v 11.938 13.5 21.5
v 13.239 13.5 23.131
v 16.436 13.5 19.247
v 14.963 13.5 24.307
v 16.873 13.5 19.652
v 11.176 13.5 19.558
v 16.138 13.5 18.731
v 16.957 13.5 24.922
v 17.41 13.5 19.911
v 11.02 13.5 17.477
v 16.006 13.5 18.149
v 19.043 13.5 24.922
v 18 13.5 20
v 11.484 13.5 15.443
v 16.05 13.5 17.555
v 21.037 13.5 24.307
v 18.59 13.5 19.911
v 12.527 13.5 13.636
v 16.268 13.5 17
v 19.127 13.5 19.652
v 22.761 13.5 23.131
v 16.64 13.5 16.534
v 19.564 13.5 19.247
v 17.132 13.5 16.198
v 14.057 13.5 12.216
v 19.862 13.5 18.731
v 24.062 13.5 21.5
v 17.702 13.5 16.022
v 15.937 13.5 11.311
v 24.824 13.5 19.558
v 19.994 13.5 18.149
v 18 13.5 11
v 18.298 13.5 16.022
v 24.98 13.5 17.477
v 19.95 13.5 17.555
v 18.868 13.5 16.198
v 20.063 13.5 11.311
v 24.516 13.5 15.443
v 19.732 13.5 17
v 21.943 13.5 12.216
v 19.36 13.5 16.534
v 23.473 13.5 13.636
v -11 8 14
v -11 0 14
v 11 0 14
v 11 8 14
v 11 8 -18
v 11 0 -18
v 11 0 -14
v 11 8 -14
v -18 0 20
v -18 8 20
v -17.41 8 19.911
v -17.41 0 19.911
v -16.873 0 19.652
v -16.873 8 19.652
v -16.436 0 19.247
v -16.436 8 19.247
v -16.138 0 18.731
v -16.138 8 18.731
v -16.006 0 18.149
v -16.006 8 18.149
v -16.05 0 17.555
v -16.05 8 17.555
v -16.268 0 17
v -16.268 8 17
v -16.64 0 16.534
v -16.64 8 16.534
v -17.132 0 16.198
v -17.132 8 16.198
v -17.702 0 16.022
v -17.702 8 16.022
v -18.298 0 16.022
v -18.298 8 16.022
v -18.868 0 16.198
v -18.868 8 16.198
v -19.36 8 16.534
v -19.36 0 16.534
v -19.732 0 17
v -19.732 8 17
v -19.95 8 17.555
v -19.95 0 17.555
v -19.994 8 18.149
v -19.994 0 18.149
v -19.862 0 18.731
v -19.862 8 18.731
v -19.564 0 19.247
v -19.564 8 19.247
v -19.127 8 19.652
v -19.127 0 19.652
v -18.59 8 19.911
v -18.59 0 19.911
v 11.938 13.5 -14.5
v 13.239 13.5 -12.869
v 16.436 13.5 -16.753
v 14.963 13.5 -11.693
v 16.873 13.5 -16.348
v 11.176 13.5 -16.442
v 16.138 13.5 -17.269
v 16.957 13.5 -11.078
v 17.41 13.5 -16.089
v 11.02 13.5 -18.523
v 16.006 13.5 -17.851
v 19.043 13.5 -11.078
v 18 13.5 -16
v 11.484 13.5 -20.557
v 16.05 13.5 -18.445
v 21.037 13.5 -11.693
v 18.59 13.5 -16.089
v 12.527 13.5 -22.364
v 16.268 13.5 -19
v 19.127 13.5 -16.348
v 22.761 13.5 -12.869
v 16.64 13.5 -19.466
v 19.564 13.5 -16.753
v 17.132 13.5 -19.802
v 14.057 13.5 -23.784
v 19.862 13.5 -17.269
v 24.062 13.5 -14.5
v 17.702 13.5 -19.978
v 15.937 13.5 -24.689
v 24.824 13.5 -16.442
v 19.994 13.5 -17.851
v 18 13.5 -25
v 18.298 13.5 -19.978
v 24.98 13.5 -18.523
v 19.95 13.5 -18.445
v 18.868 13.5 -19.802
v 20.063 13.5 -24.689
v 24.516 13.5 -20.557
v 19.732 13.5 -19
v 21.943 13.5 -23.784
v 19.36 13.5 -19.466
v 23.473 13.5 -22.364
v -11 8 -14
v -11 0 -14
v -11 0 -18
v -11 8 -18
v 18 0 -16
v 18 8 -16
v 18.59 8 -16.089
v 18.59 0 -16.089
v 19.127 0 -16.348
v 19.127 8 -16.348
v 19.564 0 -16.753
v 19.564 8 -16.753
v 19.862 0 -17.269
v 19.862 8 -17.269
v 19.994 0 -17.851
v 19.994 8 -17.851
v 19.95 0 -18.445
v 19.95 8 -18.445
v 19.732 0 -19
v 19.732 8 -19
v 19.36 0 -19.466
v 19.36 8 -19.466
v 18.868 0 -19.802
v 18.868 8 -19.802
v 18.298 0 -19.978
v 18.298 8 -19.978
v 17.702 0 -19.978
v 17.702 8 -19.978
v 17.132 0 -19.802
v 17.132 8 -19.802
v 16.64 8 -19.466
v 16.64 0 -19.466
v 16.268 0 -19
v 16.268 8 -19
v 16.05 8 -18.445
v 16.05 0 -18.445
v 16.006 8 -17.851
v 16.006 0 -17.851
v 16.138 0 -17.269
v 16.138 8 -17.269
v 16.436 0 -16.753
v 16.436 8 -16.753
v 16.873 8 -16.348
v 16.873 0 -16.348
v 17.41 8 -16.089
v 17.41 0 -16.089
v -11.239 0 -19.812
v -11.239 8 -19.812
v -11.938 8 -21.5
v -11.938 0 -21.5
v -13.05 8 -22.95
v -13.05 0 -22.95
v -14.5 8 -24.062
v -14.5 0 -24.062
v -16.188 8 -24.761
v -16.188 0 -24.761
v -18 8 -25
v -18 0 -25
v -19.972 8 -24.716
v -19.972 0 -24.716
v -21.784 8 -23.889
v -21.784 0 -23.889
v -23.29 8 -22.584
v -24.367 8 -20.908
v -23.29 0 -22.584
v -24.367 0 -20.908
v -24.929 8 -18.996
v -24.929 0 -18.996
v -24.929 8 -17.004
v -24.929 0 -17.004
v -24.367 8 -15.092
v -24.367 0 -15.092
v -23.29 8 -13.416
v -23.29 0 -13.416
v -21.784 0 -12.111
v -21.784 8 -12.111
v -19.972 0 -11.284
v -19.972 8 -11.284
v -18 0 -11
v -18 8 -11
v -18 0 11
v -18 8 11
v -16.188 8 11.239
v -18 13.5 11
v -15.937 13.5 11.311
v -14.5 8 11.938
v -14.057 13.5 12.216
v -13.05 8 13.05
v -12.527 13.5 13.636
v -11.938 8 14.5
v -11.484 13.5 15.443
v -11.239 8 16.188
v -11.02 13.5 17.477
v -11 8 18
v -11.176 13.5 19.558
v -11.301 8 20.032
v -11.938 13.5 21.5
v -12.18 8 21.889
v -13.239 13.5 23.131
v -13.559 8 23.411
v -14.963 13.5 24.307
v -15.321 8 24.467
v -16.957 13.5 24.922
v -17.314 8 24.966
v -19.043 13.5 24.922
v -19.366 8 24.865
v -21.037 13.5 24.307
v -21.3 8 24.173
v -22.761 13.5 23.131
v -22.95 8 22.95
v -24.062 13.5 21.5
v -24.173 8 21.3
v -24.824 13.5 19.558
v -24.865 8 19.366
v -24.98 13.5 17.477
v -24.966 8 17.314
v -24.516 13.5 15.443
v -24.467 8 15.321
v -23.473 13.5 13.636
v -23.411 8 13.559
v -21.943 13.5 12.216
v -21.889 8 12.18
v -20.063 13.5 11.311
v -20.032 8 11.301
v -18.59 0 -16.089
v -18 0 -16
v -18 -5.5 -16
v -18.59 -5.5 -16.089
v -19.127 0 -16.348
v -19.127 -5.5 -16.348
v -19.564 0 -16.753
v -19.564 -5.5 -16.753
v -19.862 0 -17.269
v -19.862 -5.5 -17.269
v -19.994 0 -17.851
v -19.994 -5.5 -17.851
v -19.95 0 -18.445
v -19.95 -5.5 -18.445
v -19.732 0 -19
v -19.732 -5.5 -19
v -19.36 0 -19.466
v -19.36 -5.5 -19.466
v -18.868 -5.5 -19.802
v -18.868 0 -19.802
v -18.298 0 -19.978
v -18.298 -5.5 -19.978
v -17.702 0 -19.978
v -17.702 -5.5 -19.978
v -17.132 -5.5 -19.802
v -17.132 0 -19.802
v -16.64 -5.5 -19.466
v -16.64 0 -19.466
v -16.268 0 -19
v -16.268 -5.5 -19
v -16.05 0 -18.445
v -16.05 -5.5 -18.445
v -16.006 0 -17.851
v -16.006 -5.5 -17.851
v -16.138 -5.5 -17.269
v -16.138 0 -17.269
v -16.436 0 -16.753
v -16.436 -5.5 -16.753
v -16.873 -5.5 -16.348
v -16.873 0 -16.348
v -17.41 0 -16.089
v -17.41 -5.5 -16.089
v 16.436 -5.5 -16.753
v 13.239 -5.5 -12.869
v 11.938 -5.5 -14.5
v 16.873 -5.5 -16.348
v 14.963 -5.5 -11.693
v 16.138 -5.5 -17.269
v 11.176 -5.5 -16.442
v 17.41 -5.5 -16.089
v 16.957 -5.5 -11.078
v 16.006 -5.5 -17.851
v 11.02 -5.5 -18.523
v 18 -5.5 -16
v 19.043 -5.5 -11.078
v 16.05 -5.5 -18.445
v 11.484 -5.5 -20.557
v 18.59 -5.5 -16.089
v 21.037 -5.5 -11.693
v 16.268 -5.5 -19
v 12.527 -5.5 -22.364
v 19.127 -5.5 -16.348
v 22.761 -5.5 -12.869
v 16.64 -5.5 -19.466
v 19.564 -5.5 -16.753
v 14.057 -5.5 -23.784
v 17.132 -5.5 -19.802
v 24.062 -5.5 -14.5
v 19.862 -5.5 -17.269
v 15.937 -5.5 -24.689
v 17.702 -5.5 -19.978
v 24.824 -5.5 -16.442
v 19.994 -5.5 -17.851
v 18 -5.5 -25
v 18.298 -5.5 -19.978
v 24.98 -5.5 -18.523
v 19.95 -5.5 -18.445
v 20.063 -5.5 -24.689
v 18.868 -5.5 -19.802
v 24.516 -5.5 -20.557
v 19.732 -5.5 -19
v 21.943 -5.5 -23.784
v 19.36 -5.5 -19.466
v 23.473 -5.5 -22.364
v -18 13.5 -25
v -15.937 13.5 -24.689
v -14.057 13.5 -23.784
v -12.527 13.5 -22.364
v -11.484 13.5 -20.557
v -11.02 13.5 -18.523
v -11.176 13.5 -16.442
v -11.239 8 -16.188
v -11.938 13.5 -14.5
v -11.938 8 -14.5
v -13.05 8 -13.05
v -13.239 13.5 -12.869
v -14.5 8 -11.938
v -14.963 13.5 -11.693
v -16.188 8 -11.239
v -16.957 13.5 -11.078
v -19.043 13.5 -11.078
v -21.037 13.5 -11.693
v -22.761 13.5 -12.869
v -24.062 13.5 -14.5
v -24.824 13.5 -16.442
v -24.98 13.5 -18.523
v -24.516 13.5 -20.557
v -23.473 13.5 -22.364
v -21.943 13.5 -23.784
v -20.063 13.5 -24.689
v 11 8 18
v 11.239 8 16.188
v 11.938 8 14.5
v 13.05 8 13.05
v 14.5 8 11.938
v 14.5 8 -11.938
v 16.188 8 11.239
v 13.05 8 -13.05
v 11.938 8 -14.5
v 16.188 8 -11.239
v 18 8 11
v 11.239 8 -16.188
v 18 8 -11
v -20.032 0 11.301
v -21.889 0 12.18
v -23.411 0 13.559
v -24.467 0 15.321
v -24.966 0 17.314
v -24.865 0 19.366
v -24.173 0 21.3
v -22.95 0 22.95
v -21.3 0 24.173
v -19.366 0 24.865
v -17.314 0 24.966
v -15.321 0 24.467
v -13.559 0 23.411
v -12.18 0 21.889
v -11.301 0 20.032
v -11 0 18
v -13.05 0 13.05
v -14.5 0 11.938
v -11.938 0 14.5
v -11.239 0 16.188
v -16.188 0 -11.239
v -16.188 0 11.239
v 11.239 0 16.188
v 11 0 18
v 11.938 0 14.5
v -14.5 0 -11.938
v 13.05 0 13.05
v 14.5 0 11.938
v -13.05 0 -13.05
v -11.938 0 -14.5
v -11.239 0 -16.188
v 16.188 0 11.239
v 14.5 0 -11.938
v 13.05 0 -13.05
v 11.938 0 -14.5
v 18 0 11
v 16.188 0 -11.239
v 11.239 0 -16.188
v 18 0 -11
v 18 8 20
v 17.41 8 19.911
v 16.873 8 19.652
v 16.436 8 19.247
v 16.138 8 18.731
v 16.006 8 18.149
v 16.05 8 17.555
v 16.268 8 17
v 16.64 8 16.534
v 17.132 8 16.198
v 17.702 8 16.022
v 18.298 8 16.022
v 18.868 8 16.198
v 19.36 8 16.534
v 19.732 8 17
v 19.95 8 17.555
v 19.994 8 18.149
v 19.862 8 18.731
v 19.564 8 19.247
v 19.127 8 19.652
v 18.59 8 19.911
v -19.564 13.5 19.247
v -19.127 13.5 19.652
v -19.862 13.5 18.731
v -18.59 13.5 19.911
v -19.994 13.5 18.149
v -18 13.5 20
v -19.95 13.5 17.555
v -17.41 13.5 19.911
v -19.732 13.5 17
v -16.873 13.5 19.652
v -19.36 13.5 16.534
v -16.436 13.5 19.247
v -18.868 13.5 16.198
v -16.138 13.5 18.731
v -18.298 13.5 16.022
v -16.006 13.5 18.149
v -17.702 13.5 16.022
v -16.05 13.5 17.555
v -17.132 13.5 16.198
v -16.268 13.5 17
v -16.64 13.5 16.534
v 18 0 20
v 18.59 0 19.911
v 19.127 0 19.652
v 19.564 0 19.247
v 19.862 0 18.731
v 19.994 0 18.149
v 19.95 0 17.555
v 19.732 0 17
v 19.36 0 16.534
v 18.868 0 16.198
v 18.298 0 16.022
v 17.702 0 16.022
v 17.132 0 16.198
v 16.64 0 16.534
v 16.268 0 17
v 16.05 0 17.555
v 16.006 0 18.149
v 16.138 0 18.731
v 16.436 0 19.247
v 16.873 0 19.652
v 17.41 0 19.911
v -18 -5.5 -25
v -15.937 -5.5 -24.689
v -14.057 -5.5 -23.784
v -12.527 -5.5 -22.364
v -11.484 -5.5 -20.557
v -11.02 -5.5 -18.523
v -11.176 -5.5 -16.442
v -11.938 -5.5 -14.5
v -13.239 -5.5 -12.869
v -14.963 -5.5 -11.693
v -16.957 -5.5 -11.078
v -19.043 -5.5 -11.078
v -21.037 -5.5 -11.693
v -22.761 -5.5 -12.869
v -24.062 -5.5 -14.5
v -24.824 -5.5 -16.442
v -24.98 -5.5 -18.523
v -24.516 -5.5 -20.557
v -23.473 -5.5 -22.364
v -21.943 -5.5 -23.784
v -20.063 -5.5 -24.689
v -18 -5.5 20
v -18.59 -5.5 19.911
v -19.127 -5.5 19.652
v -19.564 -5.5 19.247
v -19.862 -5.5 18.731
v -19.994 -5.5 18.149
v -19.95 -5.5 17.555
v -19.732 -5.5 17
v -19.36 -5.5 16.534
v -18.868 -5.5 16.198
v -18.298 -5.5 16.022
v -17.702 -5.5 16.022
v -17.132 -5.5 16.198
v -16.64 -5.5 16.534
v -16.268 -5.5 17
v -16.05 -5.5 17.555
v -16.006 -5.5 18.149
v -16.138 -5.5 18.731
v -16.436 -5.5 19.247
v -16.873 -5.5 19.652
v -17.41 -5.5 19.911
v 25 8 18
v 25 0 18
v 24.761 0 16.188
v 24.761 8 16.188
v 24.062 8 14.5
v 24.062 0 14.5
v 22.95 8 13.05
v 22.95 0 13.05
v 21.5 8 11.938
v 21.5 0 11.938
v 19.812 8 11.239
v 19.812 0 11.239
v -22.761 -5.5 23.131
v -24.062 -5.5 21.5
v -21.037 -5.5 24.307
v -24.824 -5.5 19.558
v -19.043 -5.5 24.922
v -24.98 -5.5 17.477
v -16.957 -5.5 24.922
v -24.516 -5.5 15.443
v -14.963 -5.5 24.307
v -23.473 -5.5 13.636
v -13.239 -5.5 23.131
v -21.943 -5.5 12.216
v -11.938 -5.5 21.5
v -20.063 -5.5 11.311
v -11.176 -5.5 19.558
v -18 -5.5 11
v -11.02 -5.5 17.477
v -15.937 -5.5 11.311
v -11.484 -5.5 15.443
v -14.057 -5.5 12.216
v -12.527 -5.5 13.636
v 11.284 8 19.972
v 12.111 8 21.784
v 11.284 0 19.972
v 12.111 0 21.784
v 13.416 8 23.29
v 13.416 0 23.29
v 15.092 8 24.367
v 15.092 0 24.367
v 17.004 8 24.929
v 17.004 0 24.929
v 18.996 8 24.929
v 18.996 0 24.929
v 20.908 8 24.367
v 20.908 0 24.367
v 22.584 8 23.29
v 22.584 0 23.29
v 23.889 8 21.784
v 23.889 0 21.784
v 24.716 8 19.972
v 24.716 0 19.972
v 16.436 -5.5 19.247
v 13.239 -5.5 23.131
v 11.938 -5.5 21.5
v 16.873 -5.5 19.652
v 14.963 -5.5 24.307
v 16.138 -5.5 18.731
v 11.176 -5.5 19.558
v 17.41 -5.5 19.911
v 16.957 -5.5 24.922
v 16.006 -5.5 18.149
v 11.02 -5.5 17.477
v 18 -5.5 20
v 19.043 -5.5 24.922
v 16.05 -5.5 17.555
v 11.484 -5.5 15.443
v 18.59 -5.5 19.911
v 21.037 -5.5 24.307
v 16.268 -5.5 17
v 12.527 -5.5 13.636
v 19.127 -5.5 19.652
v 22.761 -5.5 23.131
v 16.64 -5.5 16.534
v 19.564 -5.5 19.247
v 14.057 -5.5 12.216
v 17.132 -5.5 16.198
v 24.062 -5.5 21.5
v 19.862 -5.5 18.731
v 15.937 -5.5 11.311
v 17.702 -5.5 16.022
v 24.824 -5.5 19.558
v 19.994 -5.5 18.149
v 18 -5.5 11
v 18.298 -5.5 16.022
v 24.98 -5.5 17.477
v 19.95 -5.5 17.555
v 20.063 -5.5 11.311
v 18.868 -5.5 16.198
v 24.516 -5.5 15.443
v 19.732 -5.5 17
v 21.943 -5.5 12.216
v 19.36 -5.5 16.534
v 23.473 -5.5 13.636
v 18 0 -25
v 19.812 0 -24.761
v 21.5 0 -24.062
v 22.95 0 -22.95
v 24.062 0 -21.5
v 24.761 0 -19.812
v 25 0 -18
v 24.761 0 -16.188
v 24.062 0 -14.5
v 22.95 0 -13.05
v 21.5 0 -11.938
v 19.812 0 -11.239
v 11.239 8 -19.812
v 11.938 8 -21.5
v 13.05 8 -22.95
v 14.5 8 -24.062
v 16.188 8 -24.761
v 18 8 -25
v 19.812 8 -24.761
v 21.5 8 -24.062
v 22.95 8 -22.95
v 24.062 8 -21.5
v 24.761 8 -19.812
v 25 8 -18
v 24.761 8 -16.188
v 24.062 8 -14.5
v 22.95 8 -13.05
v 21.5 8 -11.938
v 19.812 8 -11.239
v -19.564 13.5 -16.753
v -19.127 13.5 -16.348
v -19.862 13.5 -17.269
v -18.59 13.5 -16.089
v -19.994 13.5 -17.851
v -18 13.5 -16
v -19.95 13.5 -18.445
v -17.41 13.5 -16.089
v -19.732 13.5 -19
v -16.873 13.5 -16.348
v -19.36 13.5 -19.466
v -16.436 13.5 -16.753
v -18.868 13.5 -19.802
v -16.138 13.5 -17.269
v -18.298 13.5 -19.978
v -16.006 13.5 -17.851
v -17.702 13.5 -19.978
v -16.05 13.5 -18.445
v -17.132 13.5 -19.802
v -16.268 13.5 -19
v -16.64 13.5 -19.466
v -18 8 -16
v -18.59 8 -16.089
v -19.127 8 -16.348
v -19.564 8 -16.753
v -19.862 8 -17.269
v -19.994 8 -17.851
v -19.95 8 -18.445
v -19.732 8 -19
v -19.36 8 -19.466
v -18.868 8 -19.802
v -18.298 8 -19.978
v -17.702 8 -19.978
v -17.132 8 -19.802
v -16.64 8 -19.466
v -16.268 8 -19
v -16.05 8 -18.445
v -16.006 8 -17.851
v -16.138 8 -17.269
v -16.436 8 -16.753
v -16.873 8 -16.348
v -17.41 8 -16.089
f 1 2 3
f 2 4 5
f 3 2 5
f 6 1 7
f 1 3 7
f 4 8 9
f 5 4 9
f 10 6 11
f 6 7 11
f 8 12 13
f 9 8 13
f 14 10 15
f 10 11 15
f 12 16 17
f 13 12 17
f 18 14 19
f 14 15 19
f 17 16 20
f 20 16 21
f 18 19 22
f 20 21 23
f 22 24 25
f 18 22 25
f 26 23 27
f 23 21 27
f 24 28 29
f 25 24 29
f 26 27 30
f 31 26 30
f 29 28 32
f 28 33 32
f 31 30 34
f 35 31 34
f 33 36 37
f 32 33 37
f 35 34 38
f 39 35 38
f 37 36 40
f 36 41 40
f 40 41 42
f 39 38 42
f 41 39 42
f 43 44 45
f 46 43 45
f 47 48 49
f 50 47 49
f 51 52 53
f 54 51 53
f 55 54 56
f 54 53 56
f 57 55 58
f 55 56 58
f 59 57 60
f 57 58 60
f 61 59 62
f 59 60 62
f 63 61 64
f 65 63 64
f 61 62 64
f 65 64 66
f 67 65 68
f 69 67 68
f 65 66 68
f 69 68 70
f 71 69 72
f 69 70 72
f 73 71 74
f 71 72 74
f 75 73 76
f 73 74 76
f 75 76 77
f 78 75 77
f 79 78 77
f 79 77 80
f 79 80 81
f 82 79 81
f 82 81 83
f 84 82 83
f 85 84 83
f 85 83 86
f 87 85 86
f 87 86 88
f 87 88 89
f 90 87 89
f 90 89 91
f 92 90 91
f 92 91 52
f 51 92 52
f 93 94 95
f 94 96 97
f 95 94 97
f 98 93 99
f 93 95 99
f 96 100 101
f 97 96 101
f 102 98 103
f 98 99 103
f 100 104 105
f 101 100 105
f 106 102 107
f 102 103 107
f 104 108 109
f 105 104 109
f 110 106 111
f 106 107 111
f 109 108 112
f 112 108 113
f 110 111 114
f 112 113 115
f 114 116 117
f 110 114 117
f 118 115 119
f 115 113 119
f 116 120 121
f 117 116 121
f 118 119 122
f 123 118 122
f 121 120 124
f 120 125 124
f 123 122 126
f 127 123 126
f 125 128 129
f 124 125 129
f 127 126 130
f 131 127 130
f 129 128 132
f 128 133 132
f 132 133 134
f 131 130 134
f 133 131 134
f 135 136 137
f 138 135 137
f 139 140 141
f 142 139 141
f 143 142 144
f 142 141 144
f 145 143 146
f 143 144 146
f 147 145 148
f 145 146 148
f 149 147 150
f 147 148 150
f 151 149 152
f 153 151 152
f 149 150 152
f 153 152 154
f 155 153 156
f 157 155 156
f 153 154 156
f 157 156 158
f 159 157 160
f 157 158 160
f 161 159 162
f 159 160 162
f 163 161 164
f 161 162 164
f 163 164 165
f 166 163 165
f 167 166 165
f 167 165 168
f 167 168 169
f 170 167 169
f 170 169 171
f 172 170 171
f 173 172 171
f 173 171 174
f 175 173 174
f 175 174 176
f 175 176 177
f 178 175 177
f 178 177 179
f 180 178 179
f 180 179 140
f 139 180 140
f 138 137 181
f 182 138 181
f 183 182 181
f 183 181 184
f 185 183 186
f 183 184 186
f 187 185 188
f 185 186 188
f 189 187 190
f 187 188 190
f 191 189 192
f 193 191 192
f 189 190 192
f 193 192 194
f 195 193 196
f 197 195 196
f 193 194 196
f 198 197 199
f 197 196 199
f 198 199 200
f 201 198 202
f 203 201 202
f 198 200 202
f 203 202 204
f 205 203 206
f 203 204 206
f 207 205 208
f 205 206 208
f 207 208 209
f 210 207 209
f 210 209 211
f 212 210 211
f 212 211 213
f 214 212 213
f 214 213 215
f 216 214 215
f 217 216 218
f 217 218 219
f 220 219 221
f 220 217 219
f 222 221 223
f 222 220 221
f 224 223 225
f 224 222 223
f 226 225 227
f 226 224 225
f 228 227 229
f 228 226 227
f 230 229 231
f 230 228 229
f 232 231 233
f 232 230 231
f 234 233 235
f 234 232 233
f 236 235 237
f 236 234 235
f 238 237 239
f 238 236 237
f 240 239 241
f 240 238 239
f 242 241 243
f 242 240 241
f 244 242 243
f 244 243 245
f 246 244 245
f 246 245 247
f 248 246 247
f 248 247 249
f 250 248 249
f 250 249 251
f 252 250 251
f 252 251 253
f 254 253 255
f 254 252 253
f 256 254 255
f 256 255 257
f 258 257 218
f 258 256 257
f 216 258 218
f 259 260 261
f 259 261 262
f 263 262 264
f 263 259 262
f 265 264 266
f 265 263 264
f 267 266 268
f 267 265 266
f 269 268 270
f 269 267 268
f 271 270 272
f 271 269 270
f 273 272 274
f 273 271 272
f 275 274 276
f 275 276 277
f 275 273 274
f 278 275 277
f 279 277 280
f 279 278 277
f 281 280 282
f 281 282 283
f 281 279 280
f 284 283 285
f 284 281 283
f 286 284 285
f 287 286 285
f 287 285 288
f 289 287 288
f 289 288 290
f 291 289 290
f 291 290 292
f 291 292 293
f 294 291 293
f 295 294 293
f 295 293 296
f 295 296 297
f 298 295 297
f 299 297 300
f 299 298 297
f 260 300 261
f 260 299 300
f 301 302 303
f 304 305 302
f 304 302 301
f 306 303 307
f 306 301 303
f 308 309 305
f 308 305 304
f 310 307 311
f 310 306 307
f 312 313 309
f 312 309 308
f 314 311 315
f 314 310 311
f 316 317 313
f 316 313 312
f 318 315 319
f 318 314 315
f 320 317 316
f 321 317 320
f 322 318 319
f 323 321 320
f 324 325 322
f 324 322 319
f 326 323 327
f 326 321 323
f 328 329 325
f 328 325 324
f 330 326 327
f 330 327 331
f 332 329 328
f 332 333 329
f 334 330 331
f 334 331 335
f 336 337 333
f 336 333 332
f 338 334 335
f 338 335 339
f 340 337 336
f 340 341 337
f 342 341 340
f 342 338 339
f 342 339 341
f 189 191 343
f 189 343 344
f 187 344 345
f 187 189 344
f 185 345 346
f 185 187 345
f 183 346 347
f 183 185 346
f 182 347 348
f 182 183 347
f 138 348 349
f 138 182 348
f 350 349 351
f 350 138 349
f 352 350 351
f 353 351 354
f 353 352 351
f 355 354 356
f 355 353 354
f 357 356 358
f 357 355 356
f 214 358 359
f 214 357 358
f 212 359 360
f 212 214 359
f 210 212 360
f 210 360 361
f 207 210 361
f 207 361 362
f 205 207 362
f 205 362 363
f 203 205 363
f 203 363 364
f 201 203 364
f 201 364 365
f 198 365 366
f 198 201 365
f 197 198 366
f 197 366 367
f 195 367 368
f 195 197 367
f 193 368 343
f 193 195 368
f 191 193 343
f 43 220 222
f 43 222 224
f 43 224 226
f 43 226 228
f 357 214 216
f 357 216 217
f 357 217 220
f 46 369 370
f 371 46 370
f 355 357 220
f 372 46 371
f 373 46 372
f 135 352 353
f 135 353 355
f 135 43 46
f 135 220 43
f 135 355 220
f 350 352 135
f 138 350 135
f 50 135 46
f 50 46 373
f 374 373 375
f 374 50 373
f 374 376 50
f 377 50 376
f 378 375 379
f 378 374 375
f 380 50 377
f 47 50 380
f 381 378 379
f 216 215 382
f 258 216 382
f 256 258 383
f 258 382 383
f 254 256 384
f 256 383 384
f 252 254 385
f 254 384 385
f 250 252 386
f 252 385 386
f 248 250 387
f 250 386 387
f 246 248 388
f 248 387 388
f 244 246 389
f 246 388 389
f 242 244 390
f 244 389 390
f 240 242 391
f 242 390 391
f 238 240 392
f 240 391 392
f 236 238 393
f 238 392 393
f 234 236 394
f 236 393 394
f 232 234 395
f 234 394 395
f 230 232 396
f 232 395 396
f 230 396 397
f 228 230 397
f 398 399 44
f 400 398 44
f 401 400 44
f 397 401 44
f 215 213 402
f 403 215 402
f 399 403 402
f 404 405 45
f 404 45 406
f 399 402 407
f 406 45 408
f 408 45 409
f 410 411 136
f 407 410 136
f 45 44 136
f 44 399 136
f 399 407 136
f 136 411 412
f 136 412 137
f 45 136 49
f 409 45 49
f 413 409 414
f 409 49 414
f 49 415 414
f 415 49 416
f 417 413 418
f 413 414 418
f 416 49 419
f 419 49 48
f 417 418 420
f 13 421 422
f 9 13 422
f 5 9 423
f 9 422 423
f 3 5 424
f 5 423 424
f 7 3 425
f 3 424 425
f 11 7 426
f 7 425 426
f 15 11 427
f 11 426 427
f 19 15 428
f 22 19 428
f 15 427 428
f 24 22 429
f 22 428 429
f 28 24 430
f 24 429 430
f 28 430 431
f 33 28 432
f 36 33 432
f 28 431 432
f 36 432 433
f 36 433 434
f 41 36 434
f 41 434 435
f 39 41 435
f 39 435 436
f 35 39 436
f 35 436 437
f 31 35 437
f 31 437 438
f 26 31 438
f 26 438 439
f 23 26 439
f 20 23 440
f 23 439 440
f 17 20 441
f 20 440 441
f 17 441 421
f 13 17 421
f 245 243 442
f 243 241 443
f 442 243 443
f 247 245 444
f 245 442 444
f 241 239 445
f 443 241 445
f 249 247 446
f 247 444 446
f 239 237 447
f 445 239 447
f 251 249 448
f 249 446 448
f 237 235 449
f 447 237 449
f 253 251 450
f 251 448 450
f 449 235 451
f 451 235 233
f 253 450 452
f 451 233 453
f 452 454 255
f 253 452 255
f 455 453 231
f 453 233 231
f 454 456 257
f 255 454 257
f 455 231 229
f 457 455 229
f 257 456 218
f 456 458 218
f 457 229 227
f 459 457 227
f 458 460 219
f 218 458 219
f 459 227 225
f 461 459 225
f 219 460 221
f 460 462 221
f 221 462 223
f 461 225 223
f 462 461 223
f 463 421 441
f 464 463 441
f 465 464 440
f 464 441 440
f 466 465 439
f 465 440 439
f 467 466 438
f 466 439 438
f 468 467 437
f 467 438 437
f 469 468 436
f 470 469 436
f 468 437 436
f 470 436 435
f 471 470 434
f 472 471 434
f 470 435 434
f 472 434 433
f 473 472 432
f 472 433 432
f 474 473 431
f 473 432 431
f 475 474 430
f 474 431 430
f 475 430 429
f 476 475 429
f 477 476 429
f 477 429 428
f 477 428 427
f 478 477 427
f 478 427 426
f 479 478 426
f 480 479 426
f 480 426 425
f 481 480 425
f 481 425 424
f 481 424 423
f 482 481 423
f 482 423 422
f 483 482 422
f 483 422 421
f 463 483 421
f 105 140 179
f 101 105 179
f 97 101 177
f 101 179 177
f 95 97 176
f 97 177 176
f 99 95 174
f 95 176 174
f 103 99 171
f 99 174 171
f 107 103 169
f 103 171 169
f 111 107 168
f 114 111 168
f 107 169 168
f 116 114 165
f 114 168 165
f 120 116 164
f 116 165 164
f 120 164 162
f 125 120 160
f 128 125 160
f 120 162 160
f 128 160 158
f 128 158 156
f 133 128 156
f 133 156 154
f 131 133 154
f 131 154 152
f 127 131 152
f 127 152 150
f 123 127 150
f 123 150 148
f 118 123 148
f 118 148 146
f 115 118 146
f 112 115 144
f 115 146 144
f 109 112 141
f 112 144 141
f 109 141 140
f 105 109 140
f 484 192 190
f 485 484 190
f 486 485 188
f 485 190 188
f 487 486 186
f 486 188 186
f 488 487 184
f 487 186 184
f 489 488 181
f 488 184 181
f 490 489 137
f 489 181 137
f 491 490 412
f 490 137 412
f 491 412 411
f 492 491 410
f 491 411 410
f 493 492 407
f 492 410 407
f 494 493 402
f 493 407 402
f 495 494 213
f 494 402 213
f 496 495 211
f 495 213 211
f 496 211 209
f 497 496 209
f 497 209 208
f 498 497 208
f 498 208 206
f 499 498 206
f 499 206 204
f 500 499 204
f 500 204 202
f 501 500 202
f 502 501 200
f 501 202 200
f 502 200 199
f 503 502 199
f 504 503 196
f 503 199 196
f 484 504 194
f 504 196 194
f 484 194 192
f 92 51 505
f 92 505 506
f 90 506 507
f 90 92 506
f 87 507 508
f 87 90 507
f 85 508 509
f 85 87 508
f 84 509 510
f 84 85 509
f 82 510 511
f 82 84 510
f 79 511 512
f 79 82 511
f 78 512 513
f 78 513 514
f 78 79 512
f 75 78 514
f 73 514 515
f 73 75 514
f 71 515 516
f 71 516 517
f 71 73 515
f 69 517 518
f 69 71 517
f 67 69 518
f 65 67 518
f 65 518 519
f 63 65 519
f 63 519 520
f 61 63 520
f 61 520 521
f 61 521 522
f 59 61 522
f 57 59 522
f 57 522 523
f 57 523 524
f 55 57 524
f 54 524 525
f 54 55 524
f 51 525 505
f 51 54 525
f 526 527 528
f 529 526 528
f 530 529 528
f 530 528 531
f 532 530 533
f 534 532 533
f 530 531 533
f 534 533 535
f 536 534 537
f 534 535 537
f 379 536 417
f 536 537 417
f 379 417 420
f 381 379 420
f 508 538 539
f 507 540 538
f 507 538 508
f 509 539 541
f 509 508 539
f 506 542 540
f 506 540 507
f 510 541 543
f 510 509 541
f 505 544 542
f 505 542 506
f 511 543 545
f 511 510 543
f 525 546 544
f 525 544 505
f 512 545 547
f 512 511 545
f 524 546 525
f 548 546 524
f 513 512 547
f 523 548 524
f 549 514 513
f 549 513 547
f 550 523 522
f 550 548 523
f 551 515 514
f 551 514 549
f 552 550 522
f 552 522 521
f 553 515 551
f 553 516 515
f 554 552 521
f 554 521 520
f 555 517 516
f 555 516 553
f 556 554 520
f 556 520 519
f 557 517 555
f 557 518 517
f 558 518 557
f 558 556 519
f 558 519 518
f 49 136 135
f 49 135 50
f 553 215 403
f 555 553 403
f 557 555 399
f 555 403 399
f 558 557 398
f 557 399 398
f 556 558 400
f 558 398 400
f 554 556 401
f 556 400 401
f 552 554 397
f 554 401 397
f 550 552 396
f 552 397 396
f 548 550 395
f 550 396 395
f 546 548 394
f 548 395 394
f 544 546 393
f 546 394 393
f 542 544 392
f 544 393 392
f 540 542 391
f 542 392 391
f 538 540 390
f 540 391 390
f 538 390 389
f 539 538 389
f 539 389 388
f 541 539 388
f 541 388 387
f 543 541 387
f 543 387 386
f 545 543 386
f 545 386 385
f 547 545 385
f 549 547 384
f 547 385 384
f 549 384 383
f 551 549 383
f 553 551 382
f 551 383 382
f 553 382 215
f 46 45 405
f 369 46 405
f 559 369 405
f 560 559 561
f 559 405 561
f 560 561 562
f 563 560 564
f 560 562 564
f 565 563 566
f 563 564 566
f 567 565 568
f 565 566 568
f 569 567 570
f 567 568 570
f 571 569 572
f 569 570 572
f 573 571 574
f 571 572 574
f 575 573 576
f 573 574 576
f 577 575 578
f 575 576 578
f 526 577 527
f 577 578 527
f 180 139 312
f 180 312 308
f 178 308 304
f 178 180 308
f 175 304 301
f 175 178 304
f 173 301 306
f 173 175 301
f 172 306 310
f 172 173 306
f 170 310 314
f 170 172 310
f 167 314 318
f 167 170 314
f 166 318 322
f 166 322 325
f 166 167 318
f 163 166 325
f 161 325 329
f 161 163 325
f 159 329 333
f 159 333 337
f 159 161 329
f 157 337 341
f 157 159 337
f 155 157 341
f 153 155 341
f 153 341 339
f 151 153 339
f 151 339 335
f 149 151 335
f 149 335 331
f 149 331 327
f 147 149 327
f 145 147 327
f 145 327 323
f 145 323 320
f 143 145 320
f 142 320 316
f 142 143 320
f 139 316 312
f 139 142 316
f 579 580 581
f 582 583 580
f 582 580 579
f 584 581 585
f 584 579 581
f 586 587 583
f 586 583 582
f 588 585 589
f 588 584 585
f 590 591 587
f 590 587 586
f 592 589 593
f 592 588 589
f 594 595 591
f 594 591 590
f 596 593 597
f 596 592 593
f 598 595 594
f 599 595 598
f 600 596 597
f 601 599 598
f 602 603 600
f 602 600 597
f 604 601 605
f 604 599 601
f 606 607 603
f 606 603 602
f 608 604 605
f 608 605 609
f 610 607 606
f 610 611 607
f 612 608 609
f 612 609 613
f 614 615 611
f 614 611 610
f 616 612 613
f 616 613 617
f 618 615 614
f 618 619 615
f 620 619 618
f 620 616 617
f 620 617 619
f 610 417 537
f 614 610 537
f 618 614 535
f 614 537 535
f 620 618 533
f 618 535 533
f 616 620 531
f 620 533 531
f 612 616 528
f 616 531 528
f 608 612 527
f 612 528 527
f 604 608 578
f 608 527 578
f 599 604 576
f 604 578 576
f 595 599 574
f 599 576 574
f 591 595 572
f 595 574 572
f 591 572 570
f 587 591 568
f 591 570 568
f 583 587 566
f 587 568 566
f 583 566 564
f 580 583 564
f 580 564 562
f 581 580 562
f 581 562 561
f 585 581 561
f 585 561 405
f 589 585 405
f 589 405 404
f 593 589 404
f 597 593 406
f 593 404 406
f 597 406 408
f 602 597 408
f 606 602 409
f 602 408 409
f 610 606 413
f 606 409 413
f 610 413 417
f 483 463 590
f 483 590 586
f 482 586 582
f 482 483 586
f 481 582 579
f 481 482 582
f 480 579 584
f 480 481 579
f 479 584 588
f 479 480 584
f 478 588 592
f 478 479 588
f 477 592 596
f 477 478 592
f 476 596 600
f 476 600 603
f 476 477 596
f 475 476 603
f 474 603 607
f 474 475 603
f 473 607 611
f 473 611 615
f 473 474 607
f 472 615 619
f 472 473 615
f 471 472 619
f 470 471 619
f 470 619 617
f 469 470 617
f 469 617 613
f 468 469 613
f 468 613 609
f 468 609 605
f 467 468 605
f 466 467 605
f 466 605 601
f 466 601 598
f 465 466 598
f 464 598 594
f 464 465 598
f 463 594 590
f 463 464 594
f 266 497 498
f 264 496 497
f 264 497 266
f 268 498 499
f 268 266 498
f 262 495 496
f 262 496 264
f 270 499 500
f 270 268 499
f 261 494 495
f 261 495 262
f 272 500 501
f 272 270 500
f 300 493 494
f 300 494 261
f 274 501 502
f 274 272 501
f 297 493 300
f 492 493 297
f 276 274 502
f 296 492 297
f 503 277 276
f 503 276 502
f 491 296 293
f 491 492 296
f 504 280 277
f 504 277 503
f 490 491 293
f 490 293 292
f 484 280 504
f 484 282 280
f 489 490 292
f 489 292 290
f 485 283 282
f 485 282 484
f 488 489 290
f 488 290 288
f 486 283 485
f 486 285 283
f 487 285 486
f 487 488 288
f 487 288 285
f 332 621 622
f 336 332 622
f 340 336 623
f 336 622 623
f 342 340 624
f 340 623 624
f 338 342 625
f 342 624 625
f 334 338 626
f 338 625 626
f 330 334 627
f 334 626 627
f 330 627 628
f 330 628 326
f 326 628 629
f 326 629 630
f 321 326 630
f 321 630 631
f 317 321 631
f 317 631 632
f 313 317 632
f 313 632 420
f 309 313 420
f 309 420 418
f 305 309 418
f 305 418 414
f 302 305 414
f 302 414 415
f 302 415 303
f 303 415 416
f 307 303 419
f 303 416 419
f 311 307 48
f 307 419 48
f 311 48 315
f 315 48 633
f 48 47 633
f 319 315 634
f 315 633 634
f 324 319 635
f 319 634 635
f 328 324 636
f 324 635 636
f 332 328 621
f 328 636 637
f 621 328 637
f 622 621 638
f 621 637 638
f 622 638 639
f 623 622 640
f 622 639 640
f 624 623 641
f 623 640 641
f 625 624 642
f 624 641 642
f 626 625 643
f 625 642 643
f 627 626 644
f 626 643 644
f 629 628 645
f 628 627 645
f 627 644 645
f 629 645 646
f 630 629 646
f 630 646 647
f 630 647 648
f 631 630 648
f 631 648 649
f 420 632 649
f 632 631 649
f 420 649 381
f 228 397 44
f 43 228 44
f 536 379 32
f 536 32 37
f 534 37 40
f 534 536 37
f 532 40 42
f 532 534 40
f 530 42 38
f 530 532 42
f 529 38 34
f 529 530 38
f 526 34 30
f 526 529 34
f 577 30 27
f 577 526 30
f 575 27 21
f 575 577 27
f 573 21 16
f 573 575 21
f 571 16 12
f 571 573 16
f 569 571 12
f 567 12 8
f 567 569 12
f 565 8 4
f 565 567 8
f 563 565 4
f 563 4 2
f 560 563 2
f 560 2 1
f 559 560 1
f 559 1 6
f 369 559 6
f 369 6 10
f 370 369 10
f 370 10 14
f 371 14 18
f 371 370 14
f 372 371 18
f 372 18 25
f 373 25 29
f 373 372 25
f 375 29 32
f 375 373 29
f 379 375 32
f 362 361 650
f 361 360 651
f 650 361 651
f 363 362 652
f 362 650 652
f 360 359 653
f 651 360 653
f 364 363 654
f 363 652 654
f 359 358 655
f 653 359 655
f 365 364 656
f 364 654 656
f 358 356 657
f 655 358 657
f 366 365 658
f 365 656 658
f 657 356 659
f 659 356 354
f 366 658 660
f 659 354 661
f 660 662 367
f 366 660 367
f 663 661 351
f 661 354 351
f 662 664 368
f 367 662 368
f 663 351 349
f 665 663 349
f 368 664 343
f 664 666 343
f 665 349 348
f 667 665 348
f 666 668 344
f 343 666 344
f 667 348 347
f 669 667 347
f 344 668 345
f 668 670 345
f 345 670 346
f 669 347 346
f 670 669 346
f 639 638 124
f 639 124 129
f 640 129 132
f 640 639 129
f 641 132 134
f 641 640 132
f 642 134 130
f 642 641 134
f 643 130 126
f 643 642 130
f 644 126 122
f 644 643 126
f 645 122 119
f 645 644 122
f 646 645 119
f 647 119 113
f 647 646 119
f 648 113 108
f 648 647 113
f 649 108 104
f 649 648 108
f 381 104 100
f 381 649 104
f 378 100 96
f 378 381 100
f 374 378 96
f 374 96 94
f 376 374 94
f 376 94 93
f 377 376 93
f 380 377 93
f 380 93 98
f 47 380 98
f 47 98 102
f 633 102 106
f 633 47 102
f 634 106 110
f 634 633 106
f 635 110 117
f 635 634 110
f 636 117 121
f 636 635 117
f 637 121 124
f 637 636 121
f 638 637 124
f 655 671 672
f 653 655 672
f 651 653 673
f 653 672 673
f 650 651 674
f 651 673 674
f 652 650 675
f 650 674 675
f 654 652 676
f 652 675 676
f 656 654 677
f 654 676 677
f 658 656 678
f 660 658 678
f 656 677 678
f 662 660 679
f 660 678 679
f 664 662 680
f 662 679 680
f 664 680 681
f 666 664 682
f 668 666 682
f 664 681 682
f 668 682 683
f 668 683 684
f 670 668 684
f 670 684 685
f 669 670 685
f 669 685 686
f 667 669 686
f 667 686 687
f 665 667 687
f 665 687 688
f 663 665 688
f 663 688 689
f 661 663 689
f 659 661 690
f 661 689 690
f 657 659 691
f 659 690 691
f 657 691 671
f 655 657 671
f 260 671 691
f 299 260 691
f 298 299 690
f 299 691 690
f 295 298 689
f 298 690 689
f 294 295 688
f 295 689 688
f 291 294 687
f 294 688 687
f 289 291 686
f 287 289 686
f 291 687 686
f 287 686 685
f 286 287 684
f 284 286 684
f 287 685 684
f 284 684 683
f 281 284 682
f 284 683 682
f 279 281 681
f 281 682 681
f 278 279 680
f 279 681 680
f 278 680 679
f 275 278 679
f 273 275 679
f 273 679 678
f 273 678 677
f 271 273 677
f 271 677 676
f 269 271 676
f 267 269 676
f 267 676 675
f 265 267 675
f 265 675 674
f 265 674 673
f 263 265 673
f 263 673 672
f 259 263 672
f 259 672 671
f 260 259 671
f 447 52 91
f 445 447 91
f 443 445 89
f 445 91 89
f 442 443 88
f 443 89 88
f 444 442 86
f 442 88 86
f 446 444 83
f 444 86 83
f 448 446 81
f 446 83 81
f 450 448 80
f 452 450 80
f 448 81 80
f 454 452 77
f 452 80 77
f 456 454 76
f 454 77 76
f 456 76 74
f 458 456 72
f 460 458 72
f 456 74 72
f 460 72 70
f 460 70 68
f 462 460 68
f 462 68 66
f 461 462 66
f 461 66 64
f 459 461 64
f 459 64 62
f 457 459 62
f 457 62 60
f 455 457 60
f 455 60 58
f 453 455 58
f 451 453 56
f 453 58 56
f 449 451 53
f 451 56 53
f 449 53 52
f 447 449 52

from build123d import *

# Parameters (mm, degrees)
SKETCH1_W           = 22
SKETCH1_H           = 28
BOSS_EXTRUDE1_DEPTH = 8
SKETCH2_R           = 2
CUT_EXTRUDE1_DEPTH  = 37.249137921
SKETCH5_R           = 7
SKETCH5_R_2         = 2
BOSS_EXTRUDE3_DEPTH = 5.5


with BuildPart() as part:
    # Sketch1 → Boss-Extrude1 (new body)
    with BuildSketch(Plane(origin=(0, 0, 0), x_dir=(1, 0, 0), z_dir=(0, 1, 0))):
        with BuildLine():
            ThreePointArc((-18, 11), (-13.050252532, 13.050252532), (-11, 18))
            Line((-11, 18), (-18, 18))
            Line((-18, 18), (-18, 11))
        make_face()
        with BuildLine():
            Line((-18, 18), (-11, 18))
            ThreePointArc((-11, 18), (-22.949747468, 22.949747468), (-18, 11))
            Line((-18, 11), (-18, 18))
        make_face()
        with BuildLine():
            Line((-11, -18), (-11, -14))
            Line((-11, -14), (-11, 14))
            Line((-11, 14), (-11, 18))
            ThreePointArc((-11, 18), (-13.050252532, 13.050252532), (-18, 11))
            Line((-18, 11), (-18, -11))
            ThreePointArc((-18, -11), (-13.050252532, -13.050252532), (-11, -18))
        make_face()
        with BuildLine():
            ThreePointArc((-18, -11), (-22.949747468, -22.949747468), (-11, -18))
            Line((-11, -18), (-18, -18))
            Line((-18, -18), (-18, -11))
        make_face()
        with BuildLine():
            Line((-18, -18), (-11, -18))
            ThreePointArc((-11, -18), (-13.050252532, -13.050252532), (-18, -11))
            Line((-18, -11), (-18, -18))
        make_face()
        Rectangle(SKETCH1_W, SKETCH1_H)
        with BuildLine():
            ThreePointArc((18, -11), (13.050252532, -13.050252532), (11, -18))
            Line((11, -18), (18, -18))
            Line((18, -18), (18, -11))
        make_face()
        with BuildLine():
            Line((18, -18), (11, -18))
            ThreePointArc((11, -18), (18, -25), (25, -18))
            ThreePointArc((25, -18), (22.949747468, -13.050252532), (18, -11))
            Line((18, -11), (18, -18))
        make_face()
        with BuildLine():
            Line((11, 14), (11, -14))
            Line((11, -14), (11, -18))
            ThreePointArc((11, -18), (13.050252532, -13.050252532), (18, -11))
            Line((18, -11), (18, 11))
            ThreePointArc((18, 11), (13.050252532, 13.050252532), (11, 18))
            Line((11, 18), (11, 14))
        make_face()
        with BuildLine():
            ThreePointArc((25, 18), (18, 25), (11, 18))
            Line((11, 18), (18, 18))
            Line((18, 18), (18, 11))
            ThreePointArc((18, 11), (22.949747468, 13.050252532), (25, 18))
        make_face()
        with BuildLine():
            Line((18, 18), (11, 18))
            ThreePointArc((11, 18), (13.050252532, 13.050252532), (18, 11))
            Line((18, 11), (18, 18))
        make_face()
    extrude(amount=BOSS_EXTRUDE1_DEPTH)

    # Sketch2 → Cut-Extrude1 (cut, through all)
    with BuildSketch(Plane(origin=(0, 8, 0), x_dir=(1, 0, 0), z_dir=(0, 1, 0))):
        with Locations(Location((-18, 18, 0), (0, 0, 270))):
            Circle(SKETCH2_R)
        with Locations(Location((-18, -18, 0), (0, 0, 270))):
            Circle(SKETCH2_R)
        with Locations(Location((18, -18, 0), (0, 0, 270))):
            Circle(SKETCH2_R)
        with Locations(Location((18, 18, 0), (0, 0, 270))):
            Circle(SKETCH2_R)
    extrude(amount=-CUT_EXTRUDE1_DEPTH, mode=Mode.SUBTRACT)

    # Sketch5 → Boss-Extrude3 (add)
    # profile 1 of 4: a face of its own
    with BuildSketch(Plane.XZ):
        with Locations(Location((-18, 18, 0), (0, 0, 270))):
            Circle(SKETCH5_R)
        with Locations(Location((-18, 18, 0), (0, 0, 90))):
            Circle(SKETCH5_R_2, mode=Mode.SUBTRACT)
    # profile 2 of 4: a face of its own
    with BuildSketch(Plane.XZ):
        with Locations(Location((18, 18, 0), (0, 0, 270))):
            Circle(SKETCH5_R)
        with Locations(Location((18, 18, 0), (0, 0, 90))):
            Circle(SKETCH5_R_2, mode=Mode.SUBTRACT)
    # profile 3 of 4: a face of its own
    with BuildSketch(Plane.XZ):
        with Locations(Location((18, -18, 0), (0, 0, 270))):
            Circle(SKETCH5_R)
        with Locations(Location((18, -18, 0), (0, 0, 90))):
            Circle(SKETCH5_R_2, mode=Mode.SUBTRACT)
    # profile 4 of 4: a face of its own
    with BuildSketch(Plane.XZ):
        with Locations(Location((-18, -18, 0), (0, 0, 270))):
            Circle(SKETCH5_R)
        with Locations(Location((-18, -18, 0), (0, 0, 90))):
            Circle(SKETCH5_R_2, mode=Mode.SUBTRACT)
    boss_extrude3 = extrude(amount=BOSS_EXTRUDE3_DEPTH)

    # Mirror1: Boss-Extrude3 across plane
    add(boss_extrude3.mirror(Plane.ZX.offset(4)))


solid = part.part
